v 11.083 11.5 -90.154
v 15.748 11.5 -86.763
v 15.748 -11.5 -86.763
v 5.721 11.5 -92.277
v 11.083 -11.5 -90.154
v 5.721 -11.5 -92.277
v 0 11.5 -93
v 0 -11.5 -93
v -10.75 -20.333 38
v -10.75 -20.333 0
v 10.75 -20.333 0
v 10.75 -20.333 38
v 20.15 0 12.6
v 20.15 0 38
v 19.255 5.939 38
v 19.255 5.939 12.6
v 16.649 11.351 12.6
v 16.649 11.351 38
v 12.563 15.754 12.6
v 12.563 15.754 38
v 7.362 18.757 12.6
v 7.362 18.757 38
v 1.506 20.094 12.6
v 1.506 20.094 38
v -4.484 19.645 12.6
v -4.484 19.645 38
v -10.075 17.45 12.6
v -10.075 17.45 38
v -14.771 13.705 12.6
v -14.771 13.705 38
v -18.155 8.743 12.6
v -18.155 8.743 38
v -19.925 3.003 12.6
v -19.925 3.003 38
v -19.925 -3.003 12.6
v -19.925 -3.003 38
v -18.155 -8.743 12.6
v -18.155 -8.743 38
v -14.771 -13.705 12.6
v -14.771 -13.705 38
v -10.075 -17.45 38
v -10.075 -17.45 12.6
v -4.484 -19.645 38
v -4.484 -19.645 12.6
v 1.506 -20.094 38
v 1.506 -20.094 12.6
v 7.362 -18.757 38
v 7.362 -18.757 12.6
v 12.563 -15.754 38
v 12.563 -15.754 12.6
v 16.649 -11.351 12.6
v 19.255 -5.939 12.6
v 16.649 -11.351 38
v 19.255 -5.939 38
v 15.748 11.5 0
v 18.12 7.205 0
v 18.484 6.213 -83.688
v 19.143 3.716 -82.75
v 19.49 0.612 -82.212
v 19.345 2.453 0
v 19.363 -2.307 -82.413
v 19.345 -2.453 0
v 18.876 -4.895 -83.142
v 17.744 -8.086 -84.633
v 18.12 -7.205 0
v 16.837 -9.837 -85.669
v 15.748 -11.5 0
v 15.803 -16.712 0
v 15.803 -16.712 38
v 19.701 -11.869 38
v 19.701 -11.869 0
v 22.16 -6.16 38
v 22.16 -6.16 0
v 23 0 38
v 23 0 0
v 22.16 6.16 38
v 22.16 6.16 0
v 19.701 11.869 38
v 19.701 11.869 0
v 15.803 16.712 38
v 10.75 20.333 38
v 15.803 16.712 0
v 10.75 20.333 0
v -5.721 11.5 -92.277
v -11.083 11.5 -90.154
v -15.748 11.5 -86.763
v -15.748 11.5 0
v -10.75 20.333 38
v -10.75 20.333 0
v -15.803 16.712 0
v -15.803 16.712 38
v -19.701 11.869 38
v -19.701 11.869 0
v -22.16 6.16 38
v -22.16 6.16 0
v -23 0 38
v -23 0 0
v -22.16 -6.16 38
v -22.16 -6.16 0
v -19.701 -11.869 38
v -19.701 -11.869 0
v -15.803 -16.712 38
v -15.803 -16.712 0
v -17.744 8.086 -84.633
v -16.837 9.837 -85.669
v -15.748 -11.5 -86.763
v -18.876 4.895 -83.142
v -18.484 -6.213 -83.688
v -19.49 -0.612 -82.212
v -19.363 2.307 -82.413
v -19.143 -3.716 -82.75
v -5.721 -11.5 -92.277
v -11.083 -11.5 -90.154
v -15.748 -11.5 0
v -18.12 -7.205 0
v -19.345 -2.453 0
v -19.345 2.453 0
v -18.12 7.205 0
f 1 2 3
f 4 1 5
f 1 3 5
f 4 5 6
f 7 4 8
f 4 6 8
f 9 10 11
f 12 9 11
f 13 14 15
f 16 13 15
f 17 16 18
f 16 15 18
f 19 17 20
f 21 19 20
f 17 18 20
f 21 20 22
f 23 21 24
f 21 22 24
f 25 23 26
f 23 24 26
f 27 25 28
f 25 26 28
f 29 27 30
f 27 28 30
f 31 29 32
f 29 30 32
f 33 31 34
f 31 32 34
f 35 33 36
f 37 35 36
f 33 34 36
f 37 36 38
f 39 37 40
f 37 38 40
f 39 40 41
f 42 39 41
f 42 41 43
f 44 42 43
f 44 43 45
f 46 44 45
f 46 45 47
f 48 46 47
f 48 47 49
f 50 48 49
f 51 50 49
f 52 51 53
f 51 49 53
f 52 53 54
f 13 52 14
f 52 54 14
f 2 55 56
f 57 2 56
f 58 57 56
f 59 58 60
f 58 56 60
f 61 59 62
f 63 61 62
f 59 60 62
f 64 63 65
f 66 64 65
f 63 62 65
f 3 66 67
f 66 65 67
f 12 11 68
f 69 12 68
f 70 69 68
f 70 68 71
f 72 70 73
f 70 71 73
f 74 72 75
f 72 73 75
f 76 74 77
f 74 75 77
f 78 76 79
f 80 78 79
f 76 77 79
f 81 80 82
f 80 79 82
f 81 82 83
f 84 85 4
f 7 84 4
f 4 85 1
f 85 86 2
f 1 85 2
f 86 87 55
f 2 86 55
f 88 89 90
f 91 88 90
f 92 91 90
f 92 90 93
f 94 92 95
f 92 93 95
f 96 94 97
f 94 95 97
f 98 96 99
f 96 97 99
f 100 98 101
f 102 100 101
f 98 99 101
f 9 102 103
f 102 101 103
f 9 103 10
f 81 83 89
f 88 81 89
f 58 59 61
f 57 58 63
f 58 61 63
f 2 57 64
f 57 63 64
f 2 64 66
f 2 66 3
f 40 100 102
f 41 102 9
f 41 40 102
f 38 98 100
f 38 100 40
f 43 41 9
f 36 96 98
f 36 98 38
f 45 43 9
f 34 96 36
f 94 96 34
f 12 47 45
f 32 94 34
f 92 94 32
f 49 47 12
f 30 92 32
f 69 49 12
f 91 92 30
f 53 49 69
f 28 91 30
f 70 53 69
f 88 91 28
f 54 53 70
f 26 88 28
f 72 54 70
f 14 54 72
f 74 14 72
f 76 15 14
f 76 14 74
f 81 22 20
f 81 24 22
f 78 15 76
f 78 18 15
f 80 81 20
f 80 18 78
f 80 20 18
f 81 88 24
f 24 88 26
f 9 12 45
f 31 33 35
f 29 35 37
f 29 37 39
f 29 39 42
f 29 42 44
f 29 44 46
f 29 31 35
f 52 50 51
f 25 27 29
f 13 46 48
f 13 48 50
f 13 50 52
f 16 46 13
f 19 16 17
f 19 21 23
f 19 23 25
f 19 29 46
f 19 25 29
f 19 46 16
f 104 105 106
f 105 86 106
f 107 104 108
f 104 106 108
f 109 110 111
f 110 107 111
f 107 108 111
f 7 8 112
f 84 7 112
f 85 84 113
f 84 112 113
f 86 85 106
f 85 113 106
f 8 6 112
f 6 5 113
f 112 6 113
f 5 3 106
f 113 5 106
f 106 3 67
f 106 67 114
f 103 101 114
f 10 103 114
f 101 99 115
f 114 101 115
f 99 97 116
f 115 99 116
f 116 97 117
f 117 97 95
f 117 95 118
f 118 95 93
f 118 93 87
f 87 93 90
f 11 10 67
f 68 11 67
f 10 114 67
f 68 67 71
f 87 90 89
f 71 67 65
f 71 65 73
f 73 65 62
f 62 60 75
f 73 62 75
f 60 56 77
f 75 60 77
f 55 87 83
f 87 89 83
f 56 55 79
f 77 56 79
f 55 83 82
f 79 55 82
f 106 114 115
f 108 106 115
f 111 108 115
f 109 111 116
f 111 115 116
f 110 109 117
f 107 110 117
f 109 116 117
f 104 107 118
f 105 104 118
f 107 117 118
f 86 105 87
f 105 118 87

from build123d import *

# Parameters (mm, degrees)
F1_DEPTH = 38
F2_R     = 20.15
F3_DEPTH = 25.4
F5_DEPTH = 93
F7_DEPTH = 31.834163


with BuildPart() as f1:
    # F0 (on Top) → F1 (new body)
    with BuildSketch(Plane.XY):
        with BuildLine():
            Line((10.75, 20.333163), (-10.75, 20.333163))
            ThreePointArc((-10.75, 20.333163), (-23, 0), (-10.75, -20.333163))
            Line((-10.75, -20.333163), (10.75, -20.333163))
            ThreePointArc((10.75, -20.333163), (23, 0), (10.75, 20.333163))
        make_face()
    extrude(amount=F1_DEPTH)

    # F2 (on face) → F3 (cut)
    with BuildSketch(Plane.XY.offset(38)):
        Circle(F2_R)
    extrude(amount=-F3_DEPTH, mode=Mode.SUBTRACT)

    # F4 (on face) → F5 (join)
    with BuildSketch(Plane(origin=(0, 0, 0), x_dir=(1, 0, 0), z_dir=(0, 0, -1))):
        with BuildLine():
            Line((15.748016, 11.5), (-15.748016, 11.5))
            ThreePointArc((-15.748016, 11.5), (-19.5, 0), (-15.748016, -11.5))
            Line((-15.748016, -11.5), (15.748016, -11.5))
            ThreePointArc((15.748016, -11.5), (19.5, 0), (15.748016, 11.5))
        make_face()
    extrude(amount=F5_DEPTH)

    # F6 (on face) → F7 (cut, through all)
    with BuildSketch(Plane.XZ.offset(11.5)):
        with BuildLine():
            ThreePointArc((-15.748016, -86.763055), (-19.645798, -81.960042), (-22.122635, -76.291981))
            Line((-22.122635, -76.291981), (-44.180881, -110.498317))
            Line((-44.180881, -110.498317), (51.086351, -107.824139))
            Line((51.086351, -107.824139), (22.594881, -74.29783))
            ThreePointArc((22.594881, -74.29783), (20.159114, -81.072945), (15.748016, -86.763055))
            Line((15.748016, -86.763055), (15.748016, -93))
            Line((15.748016, -93), (0, -93))
            Line((0, -93), (-15.748016, -93))
            Line((-15.748016, -93), (-15.748016, -86.763055))
        make_face()
        with BuildLine():
            ThreePointArc((15.748016, -86.763055), (8.469054, -91.383992), (0, -93))
            Line((0, -93), (15.748016, -93))
            Line((15.748016, -93), (15.748016, -86.763055))
        make_face()
        with BuildLine():
            ThreePointArc((0, -93), (-8.469054, -91.383992), (-15.748016, -86.763055))
            Line((-15.748016, -86.763055), (-15.748016, -93))
            Line((-15.748016, -93), (0, -93))
        make_face()
    extrude(amount=-F7_DEPTH, mode=Mode.SUBTRACT)


solid = f1.part
